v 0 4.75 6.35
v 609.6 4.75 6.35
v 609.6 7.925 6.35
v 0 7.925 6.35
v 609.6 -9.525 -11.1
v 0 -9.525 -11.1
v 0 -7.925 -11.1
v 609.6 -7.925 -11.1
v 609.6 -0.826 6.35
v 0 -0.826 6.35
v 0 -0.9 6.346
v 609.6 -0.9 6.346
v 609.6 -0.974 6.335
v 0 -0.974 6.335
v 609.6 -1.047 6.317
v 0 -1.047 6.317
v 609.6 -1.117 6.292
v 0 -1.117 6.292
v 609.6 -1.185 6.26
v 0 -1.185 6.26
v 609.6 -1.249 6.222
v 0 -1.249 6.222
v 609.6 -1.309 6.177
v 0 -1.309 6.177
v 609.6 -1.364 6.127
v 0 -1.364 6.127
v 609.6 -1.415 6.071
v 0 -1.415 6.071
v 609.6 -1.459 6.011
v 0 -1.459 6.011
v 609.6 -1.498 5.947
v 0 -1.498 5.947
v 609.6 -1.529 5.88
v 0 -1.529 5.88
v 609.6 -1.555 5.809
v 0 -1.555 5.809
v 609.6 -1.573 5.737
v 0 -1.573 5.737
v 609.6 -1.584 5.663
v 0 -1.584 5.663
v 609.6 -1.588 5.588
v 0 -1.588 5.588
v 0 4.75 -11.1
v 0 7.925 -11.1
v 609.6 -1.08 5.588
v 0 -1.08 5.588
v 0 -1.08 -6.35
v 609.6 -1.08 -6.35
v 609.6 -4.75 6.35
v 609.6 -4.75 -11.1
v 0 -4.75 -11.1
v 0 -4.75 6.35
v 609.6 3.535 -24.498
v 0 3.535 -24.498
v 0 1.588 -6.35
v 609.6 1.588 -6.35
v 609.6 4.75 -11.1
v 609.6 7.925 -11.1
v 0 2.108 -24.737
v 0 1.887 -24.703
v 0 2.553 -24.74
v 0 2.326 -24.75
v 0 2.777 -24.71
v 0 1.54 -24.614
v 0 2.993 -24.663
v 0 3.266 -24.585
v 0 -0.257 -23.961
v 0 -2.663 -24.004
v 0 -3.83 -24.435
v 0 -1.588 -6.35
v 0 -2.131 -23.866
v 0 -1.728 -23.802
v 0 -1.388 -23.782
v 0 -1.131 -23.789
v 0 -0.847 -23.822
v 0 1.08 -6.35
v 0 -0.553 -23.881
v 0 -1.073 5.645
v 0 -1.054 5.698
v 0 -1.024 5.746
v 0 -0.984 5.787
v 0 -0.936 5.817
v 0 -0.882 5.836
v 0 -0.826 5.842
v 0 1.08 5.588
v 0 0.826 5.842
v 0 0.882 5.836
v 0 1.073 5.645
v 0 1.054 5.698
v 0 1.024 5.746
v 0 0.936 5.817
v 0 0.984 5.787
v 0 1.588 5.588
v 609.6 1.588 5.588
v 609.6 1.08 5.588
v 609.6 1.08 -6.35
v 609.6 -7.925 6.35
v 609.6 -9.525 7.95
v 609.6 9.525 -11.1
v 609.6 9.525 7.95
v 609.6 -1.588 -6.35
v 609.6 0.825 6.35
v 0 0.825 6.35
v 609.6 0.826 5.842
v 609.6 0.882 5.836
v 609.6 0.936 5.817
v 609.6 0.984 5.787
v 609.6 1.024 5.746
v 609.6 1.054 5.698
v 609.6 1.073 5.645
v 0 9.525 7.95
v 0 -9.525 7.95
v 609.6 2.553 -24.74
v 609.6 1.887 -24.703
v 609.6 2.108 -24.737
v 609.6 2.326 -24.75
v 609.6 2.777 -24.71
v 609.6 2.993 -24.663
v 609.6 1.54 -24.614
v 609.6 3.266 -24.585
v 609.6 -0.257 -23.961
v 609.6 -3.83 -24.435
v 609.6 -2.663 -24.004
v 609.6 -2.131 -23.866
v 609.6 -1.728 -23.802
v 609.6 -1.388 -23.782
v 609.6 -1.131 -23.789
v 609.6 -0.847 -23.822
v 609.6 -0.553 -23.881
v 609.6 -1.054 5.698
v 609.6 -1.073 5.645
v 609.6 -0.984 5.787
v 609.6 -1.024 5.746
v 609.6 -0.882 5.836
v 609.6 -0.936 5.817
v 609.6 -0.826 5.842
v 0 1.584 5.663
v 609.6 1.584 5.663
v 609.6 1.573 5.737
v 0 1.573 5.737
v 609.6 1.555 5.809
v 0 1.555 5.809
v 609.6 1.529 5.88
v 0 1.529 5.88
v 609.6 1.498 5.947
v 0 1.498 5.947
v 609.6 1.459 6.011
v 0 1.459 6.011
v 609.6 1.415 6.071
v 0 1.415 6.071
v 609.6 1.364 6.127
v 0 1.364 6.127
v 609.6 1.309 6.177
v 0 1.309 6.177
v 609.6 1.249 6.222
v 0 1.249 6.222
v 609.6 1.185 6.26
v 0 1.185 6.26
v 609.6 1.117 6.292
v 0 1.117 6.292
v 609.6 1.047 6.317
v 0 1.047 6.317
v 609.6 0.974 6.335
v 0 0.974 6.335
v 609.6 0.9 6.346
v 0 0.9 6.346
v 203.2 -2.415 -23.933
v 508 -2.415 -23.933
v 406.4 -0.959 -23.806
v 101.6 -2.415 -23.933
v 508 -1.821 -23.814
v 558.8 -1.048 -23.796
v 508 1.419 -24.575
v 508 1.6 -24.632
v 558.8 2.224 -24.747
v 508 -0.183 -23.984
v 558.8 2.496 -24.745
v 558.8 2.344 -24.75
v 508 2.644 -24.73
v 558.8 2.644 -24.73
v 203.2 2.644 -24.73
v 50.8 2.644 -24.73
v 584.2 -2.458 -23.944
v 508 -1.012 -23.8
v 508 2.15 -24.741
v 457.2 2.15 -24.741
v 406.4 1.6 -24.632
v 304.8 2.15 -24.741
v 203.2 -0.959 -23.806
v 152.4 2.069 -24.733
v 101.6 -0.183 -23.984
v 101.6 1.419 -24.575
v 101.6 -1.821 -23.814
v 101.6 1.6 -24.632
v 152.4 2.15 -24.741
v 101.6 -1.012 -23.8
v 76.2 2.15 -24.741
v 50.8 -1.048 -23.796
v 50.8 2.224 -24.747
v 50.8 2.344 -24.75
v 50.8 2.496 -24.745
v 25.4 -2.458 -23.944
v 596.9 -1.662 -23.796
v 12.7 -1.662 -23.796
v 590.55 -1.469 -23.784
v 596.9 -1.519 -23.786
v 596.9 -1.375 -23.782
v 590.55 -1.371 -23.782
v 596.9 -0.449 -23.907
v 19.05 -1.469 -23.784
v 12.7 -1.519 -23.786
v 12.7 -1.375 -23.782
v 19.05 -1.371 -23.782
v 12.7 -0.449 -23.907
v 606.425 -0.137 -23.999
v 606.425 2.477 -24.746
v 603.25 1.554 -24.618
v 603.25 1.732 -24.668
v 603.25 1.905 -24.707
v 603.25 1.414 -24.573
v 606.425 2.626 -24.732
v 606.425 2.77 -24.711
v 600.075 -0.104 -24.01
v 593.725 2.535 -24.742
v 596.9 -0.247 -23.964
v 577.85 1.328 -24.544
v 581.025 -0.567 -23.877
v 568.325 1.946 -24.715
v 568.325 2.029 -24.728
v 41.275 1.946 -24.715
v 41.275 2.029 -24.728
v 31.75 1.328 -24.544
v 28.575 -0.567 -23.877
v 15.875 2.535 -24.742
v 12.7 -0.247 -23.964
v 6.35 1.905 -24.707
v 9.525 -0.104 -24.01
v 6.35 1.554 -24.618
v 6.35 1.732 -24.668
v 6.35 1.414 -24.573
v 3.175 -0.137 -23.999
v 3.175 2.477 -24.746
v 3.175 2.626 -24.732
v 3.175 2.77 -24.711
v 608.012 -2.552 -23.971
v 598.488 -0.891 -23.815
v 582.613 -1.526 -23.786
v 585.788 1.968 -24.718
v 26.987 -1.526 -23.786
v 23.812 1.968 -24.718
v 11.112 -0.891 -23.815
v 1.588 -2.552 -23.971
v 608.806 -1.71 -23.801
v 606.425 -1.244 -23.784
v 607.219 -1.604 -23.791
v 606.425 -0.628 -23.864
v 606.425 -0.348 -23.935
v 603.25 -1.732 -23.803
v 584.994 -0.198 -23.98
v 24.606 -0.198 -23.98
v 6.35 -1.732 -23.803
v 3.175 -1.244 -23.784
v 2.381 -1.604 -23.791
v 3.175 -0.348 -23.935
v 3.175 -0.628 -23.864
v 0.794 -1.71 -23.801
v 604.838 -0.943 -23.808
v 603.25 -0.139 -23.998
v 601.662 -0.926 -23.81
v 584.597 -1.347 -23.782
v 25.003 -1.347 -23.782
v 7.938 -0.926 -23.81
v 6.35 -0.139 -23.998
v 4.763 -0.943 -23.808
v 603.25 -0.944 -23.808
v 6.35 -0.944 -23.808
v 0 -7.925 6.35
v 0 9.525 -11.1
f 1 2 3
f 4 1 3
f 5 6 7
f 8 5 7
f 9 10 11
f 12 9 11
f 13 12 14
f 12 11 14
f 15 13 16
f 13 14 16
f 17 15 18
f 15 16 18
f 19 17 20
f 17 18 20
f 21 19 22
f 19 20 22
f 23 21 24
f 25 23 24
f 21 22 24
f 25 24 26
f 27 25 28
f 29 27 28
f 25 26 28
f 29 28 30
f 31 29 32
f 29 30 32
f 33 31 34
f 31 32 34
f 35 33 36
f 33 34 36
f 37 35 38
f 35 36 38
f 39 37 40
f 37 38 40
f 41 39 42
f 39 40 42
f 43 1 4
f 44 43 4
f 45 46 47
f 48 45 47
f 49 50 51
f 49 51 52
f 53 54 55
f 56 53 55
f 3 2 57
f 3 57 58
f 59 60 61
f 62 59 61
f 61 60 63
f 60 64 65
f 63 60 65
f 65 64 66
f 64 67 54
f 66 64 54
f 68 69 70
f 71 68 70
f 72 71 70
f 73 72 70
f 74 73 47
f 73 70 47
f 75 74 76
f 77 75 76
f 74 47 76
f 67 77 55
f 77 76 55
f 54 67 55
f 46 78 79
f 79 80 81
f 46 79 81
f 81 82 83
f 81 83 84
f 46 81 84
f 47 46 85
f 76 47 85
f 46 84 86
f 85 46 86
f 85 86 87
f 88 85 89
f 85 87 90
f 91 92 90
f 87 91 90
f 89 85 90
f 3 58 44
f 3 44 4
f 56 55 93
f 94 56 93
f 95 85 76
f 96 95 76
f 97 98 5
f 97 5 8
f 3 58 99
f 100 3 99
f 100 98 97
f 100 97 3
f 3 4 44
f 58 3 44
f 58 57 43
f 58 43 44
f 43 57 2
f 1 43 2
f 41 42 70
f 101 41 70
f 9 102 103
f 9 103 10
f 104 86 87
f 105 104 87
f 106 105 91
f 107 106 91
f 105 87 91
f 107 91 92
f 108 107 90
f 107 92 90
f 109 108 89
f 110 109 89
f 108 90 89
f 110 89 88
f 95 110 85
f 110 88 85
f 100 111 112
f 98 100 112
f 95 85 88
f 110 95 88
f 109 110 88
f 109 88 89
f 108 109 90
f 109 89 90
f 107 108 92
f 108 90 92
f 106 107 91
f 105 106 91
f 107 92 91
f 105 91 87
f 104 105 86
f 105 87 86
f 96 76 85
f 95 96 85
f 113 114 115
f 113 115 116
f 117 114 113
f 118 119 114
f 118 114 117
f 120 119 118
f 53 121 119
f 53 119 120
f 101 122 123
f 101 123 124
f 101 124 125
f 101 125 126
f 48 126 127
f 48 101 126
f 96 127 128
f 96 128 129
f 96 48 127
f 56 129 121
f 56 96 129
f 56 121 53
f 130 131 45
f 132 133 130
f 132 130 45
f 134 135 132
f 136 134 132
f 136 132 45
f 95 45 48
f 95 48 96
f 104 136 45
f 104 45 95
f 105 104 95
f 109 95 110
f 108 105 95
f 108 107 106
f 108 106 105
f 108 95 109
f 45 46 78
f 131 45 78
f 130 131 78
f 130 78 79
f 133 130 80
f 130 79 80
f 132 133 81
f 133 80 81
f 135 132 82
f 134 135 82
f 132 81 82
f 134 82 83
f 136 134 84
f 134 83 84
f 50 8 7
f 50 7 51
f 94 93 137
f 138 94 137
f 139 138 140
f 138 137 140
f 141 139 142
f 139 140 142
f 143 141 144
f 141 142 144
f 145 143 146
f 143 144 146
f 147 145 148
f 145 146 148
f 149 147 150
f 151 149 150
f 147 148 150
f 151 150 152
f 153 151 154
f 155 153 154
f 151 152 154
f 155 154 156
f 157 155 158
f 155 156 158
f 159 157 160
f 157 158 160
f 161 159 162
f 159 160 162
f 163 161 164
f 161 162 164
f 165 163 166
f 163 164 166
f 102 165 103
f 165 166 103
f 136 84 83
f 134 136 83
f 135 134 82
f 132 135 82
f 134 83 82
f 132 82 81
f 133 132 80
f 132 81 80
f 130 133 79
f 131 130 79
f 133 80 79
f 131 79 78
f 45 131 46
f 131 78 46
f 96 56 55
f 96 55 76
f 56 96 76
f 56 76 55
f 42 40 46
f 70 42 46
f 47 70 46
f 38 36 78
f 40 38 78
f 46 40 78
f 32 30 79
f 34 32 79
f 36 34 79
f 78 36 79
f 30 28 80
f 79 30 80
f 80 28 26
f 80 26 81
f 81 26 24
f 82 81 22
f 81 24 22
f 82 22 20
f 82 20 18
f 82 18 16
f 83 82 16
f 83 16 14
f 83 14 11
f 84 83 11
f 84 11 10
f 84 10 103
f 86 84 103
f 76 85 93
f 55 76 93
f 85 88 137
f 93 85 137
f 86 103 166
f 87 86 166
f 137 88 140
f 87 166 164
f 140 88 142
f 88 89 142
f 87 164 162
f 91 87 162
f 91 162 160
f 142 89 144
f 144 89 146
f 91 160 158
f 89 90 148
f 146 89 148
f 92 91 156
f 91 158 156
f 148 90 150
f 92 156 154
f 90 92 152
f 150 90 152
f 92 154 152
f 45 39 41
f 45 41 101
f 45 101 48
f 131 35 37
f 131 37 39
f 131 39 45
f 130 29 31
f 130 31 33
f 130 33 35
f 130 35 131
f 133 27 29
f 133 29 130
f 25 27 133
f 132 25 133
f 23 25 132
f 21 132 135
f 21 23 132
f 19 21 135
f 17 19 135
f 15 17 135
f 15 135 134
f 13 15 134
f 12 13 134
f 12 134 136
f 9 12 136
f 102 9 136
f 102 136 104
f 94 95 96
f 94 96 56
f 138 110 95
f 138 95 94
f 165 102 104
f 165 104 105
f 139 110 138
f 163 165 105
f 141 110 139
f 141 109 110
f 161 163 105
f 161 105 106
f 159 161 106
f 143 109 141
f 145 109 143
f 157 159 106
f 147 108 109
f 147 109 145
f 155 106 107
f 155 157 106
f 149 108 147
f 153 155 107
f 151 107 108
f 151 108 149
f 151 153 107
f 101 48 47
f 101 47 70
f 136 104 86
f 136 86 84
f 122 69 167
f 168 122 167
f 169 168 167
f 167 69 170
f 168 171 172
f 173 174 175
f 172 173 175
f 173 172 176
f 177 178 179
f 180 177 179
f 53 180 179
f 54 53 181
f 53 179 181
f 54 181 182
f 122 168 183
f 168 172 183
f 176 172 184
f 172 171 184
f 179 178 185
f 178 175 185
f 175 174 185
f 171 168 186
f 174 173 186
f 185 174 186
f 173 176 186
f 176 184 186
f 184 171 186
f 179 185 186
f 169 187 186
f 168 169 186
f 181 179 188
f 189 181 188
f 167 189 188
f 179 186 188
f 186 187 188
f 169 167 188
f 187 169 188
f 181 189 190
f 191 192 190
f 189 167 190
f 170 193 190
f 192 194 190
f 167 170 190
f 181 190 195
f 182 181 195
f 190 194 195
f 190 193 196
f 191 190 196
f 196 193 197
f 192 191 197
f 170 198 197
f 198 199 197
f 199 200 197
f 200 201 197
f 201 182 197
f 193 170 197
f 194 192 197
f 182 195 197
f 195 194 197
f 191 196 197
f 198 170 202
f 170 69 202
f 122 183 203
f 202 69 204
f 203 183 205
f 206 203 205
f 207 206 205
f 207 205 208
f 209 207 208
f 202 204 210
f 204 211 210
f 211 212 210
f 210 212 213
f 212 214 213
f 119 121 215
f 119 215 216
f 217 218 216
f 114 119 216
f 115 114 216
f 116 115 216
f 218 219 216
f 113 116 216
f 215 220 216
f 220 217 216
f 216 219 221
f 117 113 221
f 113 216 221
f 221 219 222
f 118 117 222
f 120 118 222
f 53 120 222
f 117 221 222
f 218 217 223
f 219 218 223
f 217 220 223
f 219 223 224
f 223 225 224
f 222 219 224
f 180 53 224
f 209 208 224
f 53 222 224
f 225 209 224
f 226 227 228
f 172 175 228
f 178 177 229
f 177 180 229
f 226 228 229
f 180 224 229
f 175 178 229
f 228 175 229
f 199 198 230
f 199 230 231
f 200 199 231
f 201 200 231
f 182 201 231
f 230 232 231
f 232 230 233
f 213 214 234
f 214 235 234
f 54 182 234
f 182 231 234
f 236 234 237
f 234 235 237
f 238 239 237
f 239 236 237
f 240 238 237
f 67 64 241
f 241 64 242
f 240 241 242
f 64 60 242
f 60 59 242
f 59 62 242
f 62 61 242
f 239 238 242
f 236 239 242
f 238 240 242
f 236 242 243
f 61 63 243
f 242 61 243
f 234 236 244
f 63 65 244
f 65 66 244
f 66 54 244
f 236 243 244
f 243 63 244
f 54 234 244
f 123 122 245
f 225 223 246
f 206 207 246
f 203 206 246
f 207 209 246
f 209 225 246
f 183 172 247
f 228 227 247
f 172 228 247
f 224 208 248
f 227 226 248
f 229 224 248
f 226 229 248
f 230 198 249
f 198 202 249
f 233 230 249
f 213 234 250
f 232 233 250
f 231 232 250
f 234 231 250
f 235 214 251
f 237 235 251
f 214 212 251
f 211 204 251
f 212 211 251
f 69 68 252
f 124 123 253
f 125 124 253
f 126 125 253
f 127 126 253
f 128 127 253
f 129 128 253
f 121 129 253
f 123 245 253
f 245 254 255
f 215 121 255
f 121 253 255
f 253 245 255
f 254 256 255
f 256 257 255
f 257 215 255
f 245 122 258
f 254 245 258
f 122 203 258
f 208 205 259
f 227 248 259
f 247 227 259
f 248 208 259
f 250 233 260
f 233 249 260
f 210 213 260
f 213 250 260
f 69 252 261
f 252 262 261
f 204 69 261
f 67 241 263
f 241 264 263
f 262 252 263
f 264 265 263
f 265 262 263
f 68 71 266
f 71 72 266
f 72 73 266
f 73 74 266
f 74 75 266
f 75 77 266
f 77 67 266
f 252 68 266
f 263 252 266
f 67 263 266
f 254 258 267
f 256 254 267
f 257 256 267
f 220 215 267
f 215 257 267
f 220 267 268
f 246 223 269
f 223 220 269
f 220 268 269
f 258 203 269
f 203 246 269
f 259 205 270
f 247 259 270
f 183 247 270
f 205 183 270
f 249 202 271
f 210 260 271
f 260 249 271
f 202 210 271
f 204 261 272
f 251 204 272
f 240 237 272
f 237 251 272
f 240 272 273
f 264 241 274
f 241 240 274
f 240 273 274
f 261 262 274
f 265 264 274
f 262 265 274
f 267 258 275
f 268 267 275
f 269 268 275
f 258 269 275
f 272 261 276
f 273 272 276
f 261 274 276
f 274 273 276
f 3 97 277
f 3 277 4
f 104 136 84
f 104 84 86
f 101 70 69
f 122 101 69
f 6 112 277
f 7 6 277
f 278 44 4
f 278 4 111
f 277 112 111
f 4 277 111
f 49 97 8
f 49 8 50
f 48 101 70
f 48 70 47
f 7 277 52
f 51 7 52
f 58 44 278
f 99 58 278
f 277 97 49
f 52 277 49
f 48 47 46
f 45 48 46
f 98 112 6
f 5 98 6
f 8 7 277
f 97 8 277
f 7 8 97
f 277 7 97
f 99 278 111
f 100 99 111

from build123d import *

# Parameters (mm, degrees)
F1_DEPTH = 609.6
F2_DEPTH = 609.6
F4_DEPTH = 609.6
F5_W     = 3.175
F5_H     = 17.4498
F6_DEPTH = 609.6


with BuildPart() as f1:
    # F0 (on Right) → F1 (new body)
    with BuildSketch(Plane.YZ):
        with BuildLine():
            Line((3.5347570665, -24.4977846742), (1.5875, -6.35))
            Line((1.5875, -6.35), (1.0795, -6.35))
            Line((1.0795, -6.35), (1.0795, 5.588))
            ThreePointArc((1.0795, 5.588), (1.0051051224, 5.7676051224), (0.8255, 5.842))
            Line((0.8255, 5.842), (-0.8255, 5.842))
            ThreePointArc((-0.8255, 5.842), (-1.0051051224, 5.7676051224), (-1.0795, 5.588))
            Line((-1.0795, 5.588), (-1.0795, -6.35))
            Line((-1.0795, -6.35), (-1.5875, -6.35))
            Line((-1.5875, -6.35), (-3.8300808519, -24.434838444))
            add(Edge.make_bspline(
                [(-3.8300808519, -24.434838444), (-2.8915608054, -24.0586638793), (-0.994458426, -23.2982734493), (1.8996103237, -25.0427717885), (3.0526992974, -24.658452378), (3.5347570665, -24.4977846742)],
                knots=[0, 0, 0, 0, 0.362961047, 0.7336809357, 1, 1, 1, 1], degree=3))
        make_face()
    extrude(amount=F1_DEPTH)


with BuildPart() as f2:
    # F0 (on Right) → F2 (new body)
    with BuildSketch(Plane.YZ):
        with BuildLine():
            ThreePointArc((1.5875, 5.588), (1.3643153673, 6.1268153673), (0.8255, 6.35))
            Line((0.8255, 6.35), (-0.8255, 6.35))
            ThreePointArc((-0.8255, 6.35), (-1.3643153673, 6.1268153673), (-1.5875, 5.588))
            Line((-1.5875, 5.588), (-1.5875, -6.35))
            Line((-1.5875, -6.35), (-1.0795, -6.35))
            Line((-1.0795, -6.35), (-1.0795, 5.588))
            ThreePointArc((-1.0795, 5.588), (-1.0051051224, 5.7676051224), (-0.8255, 5.842))
            Line((-0.8255, 5.842), (0.8255, 5.842))
            ThreePointArc((0.8255, 5.842), (1.0051051224, 5.7676051224), (1.0795, 5.588))
            Line((1.0795, 5.588), (1.0795, -6.35))
            Line((1.0795, -6.35), (1.5875, -6.35))
            Line((1.5875, -6.35), (1.5875, 5.588))
        make_face()
    extrude(amount=F2_DEPTH)


with BuildPart() as f4:
    # F3 (on Right) → F4 (new body)
    with BuildSketch(Plane.YZ):
        Polygon((7.9248, -11.0998), (9.525, -11.0998), (9.525, 7.9502), (-9.525, 7.9502), (-9.525, -11.0998), (-7.9248, -11.0998), (-7.9248, 6.35), (7.9248, 6.35), align=None)
    extrude(amount=F4_DEPTH)


with BuildPart() as f6:
    # F5 (on face) → F6 (new body)
    with BuildSketch(Plane.YZ.offset(609.6)):
        with Locations((-6.3373, -2.3749)):
            Rectangle(F5_W, F5_H)
    extrude(amount=-F6_DEPTH)


with BuildPart() as f6b:
    # F5 (on face) → F6, piece 2 (new body)
    with BuildSketch(Plane.YZ.offset(609.6)):
        with Locations((6.3373, -2.3749)):
            Rectangle(F5_W, F5_H)
    extrude(amount=-F6_DEPTH)


solid = Compound([f1.part, f2.part, f4.part, f6.part, f6b.part])
